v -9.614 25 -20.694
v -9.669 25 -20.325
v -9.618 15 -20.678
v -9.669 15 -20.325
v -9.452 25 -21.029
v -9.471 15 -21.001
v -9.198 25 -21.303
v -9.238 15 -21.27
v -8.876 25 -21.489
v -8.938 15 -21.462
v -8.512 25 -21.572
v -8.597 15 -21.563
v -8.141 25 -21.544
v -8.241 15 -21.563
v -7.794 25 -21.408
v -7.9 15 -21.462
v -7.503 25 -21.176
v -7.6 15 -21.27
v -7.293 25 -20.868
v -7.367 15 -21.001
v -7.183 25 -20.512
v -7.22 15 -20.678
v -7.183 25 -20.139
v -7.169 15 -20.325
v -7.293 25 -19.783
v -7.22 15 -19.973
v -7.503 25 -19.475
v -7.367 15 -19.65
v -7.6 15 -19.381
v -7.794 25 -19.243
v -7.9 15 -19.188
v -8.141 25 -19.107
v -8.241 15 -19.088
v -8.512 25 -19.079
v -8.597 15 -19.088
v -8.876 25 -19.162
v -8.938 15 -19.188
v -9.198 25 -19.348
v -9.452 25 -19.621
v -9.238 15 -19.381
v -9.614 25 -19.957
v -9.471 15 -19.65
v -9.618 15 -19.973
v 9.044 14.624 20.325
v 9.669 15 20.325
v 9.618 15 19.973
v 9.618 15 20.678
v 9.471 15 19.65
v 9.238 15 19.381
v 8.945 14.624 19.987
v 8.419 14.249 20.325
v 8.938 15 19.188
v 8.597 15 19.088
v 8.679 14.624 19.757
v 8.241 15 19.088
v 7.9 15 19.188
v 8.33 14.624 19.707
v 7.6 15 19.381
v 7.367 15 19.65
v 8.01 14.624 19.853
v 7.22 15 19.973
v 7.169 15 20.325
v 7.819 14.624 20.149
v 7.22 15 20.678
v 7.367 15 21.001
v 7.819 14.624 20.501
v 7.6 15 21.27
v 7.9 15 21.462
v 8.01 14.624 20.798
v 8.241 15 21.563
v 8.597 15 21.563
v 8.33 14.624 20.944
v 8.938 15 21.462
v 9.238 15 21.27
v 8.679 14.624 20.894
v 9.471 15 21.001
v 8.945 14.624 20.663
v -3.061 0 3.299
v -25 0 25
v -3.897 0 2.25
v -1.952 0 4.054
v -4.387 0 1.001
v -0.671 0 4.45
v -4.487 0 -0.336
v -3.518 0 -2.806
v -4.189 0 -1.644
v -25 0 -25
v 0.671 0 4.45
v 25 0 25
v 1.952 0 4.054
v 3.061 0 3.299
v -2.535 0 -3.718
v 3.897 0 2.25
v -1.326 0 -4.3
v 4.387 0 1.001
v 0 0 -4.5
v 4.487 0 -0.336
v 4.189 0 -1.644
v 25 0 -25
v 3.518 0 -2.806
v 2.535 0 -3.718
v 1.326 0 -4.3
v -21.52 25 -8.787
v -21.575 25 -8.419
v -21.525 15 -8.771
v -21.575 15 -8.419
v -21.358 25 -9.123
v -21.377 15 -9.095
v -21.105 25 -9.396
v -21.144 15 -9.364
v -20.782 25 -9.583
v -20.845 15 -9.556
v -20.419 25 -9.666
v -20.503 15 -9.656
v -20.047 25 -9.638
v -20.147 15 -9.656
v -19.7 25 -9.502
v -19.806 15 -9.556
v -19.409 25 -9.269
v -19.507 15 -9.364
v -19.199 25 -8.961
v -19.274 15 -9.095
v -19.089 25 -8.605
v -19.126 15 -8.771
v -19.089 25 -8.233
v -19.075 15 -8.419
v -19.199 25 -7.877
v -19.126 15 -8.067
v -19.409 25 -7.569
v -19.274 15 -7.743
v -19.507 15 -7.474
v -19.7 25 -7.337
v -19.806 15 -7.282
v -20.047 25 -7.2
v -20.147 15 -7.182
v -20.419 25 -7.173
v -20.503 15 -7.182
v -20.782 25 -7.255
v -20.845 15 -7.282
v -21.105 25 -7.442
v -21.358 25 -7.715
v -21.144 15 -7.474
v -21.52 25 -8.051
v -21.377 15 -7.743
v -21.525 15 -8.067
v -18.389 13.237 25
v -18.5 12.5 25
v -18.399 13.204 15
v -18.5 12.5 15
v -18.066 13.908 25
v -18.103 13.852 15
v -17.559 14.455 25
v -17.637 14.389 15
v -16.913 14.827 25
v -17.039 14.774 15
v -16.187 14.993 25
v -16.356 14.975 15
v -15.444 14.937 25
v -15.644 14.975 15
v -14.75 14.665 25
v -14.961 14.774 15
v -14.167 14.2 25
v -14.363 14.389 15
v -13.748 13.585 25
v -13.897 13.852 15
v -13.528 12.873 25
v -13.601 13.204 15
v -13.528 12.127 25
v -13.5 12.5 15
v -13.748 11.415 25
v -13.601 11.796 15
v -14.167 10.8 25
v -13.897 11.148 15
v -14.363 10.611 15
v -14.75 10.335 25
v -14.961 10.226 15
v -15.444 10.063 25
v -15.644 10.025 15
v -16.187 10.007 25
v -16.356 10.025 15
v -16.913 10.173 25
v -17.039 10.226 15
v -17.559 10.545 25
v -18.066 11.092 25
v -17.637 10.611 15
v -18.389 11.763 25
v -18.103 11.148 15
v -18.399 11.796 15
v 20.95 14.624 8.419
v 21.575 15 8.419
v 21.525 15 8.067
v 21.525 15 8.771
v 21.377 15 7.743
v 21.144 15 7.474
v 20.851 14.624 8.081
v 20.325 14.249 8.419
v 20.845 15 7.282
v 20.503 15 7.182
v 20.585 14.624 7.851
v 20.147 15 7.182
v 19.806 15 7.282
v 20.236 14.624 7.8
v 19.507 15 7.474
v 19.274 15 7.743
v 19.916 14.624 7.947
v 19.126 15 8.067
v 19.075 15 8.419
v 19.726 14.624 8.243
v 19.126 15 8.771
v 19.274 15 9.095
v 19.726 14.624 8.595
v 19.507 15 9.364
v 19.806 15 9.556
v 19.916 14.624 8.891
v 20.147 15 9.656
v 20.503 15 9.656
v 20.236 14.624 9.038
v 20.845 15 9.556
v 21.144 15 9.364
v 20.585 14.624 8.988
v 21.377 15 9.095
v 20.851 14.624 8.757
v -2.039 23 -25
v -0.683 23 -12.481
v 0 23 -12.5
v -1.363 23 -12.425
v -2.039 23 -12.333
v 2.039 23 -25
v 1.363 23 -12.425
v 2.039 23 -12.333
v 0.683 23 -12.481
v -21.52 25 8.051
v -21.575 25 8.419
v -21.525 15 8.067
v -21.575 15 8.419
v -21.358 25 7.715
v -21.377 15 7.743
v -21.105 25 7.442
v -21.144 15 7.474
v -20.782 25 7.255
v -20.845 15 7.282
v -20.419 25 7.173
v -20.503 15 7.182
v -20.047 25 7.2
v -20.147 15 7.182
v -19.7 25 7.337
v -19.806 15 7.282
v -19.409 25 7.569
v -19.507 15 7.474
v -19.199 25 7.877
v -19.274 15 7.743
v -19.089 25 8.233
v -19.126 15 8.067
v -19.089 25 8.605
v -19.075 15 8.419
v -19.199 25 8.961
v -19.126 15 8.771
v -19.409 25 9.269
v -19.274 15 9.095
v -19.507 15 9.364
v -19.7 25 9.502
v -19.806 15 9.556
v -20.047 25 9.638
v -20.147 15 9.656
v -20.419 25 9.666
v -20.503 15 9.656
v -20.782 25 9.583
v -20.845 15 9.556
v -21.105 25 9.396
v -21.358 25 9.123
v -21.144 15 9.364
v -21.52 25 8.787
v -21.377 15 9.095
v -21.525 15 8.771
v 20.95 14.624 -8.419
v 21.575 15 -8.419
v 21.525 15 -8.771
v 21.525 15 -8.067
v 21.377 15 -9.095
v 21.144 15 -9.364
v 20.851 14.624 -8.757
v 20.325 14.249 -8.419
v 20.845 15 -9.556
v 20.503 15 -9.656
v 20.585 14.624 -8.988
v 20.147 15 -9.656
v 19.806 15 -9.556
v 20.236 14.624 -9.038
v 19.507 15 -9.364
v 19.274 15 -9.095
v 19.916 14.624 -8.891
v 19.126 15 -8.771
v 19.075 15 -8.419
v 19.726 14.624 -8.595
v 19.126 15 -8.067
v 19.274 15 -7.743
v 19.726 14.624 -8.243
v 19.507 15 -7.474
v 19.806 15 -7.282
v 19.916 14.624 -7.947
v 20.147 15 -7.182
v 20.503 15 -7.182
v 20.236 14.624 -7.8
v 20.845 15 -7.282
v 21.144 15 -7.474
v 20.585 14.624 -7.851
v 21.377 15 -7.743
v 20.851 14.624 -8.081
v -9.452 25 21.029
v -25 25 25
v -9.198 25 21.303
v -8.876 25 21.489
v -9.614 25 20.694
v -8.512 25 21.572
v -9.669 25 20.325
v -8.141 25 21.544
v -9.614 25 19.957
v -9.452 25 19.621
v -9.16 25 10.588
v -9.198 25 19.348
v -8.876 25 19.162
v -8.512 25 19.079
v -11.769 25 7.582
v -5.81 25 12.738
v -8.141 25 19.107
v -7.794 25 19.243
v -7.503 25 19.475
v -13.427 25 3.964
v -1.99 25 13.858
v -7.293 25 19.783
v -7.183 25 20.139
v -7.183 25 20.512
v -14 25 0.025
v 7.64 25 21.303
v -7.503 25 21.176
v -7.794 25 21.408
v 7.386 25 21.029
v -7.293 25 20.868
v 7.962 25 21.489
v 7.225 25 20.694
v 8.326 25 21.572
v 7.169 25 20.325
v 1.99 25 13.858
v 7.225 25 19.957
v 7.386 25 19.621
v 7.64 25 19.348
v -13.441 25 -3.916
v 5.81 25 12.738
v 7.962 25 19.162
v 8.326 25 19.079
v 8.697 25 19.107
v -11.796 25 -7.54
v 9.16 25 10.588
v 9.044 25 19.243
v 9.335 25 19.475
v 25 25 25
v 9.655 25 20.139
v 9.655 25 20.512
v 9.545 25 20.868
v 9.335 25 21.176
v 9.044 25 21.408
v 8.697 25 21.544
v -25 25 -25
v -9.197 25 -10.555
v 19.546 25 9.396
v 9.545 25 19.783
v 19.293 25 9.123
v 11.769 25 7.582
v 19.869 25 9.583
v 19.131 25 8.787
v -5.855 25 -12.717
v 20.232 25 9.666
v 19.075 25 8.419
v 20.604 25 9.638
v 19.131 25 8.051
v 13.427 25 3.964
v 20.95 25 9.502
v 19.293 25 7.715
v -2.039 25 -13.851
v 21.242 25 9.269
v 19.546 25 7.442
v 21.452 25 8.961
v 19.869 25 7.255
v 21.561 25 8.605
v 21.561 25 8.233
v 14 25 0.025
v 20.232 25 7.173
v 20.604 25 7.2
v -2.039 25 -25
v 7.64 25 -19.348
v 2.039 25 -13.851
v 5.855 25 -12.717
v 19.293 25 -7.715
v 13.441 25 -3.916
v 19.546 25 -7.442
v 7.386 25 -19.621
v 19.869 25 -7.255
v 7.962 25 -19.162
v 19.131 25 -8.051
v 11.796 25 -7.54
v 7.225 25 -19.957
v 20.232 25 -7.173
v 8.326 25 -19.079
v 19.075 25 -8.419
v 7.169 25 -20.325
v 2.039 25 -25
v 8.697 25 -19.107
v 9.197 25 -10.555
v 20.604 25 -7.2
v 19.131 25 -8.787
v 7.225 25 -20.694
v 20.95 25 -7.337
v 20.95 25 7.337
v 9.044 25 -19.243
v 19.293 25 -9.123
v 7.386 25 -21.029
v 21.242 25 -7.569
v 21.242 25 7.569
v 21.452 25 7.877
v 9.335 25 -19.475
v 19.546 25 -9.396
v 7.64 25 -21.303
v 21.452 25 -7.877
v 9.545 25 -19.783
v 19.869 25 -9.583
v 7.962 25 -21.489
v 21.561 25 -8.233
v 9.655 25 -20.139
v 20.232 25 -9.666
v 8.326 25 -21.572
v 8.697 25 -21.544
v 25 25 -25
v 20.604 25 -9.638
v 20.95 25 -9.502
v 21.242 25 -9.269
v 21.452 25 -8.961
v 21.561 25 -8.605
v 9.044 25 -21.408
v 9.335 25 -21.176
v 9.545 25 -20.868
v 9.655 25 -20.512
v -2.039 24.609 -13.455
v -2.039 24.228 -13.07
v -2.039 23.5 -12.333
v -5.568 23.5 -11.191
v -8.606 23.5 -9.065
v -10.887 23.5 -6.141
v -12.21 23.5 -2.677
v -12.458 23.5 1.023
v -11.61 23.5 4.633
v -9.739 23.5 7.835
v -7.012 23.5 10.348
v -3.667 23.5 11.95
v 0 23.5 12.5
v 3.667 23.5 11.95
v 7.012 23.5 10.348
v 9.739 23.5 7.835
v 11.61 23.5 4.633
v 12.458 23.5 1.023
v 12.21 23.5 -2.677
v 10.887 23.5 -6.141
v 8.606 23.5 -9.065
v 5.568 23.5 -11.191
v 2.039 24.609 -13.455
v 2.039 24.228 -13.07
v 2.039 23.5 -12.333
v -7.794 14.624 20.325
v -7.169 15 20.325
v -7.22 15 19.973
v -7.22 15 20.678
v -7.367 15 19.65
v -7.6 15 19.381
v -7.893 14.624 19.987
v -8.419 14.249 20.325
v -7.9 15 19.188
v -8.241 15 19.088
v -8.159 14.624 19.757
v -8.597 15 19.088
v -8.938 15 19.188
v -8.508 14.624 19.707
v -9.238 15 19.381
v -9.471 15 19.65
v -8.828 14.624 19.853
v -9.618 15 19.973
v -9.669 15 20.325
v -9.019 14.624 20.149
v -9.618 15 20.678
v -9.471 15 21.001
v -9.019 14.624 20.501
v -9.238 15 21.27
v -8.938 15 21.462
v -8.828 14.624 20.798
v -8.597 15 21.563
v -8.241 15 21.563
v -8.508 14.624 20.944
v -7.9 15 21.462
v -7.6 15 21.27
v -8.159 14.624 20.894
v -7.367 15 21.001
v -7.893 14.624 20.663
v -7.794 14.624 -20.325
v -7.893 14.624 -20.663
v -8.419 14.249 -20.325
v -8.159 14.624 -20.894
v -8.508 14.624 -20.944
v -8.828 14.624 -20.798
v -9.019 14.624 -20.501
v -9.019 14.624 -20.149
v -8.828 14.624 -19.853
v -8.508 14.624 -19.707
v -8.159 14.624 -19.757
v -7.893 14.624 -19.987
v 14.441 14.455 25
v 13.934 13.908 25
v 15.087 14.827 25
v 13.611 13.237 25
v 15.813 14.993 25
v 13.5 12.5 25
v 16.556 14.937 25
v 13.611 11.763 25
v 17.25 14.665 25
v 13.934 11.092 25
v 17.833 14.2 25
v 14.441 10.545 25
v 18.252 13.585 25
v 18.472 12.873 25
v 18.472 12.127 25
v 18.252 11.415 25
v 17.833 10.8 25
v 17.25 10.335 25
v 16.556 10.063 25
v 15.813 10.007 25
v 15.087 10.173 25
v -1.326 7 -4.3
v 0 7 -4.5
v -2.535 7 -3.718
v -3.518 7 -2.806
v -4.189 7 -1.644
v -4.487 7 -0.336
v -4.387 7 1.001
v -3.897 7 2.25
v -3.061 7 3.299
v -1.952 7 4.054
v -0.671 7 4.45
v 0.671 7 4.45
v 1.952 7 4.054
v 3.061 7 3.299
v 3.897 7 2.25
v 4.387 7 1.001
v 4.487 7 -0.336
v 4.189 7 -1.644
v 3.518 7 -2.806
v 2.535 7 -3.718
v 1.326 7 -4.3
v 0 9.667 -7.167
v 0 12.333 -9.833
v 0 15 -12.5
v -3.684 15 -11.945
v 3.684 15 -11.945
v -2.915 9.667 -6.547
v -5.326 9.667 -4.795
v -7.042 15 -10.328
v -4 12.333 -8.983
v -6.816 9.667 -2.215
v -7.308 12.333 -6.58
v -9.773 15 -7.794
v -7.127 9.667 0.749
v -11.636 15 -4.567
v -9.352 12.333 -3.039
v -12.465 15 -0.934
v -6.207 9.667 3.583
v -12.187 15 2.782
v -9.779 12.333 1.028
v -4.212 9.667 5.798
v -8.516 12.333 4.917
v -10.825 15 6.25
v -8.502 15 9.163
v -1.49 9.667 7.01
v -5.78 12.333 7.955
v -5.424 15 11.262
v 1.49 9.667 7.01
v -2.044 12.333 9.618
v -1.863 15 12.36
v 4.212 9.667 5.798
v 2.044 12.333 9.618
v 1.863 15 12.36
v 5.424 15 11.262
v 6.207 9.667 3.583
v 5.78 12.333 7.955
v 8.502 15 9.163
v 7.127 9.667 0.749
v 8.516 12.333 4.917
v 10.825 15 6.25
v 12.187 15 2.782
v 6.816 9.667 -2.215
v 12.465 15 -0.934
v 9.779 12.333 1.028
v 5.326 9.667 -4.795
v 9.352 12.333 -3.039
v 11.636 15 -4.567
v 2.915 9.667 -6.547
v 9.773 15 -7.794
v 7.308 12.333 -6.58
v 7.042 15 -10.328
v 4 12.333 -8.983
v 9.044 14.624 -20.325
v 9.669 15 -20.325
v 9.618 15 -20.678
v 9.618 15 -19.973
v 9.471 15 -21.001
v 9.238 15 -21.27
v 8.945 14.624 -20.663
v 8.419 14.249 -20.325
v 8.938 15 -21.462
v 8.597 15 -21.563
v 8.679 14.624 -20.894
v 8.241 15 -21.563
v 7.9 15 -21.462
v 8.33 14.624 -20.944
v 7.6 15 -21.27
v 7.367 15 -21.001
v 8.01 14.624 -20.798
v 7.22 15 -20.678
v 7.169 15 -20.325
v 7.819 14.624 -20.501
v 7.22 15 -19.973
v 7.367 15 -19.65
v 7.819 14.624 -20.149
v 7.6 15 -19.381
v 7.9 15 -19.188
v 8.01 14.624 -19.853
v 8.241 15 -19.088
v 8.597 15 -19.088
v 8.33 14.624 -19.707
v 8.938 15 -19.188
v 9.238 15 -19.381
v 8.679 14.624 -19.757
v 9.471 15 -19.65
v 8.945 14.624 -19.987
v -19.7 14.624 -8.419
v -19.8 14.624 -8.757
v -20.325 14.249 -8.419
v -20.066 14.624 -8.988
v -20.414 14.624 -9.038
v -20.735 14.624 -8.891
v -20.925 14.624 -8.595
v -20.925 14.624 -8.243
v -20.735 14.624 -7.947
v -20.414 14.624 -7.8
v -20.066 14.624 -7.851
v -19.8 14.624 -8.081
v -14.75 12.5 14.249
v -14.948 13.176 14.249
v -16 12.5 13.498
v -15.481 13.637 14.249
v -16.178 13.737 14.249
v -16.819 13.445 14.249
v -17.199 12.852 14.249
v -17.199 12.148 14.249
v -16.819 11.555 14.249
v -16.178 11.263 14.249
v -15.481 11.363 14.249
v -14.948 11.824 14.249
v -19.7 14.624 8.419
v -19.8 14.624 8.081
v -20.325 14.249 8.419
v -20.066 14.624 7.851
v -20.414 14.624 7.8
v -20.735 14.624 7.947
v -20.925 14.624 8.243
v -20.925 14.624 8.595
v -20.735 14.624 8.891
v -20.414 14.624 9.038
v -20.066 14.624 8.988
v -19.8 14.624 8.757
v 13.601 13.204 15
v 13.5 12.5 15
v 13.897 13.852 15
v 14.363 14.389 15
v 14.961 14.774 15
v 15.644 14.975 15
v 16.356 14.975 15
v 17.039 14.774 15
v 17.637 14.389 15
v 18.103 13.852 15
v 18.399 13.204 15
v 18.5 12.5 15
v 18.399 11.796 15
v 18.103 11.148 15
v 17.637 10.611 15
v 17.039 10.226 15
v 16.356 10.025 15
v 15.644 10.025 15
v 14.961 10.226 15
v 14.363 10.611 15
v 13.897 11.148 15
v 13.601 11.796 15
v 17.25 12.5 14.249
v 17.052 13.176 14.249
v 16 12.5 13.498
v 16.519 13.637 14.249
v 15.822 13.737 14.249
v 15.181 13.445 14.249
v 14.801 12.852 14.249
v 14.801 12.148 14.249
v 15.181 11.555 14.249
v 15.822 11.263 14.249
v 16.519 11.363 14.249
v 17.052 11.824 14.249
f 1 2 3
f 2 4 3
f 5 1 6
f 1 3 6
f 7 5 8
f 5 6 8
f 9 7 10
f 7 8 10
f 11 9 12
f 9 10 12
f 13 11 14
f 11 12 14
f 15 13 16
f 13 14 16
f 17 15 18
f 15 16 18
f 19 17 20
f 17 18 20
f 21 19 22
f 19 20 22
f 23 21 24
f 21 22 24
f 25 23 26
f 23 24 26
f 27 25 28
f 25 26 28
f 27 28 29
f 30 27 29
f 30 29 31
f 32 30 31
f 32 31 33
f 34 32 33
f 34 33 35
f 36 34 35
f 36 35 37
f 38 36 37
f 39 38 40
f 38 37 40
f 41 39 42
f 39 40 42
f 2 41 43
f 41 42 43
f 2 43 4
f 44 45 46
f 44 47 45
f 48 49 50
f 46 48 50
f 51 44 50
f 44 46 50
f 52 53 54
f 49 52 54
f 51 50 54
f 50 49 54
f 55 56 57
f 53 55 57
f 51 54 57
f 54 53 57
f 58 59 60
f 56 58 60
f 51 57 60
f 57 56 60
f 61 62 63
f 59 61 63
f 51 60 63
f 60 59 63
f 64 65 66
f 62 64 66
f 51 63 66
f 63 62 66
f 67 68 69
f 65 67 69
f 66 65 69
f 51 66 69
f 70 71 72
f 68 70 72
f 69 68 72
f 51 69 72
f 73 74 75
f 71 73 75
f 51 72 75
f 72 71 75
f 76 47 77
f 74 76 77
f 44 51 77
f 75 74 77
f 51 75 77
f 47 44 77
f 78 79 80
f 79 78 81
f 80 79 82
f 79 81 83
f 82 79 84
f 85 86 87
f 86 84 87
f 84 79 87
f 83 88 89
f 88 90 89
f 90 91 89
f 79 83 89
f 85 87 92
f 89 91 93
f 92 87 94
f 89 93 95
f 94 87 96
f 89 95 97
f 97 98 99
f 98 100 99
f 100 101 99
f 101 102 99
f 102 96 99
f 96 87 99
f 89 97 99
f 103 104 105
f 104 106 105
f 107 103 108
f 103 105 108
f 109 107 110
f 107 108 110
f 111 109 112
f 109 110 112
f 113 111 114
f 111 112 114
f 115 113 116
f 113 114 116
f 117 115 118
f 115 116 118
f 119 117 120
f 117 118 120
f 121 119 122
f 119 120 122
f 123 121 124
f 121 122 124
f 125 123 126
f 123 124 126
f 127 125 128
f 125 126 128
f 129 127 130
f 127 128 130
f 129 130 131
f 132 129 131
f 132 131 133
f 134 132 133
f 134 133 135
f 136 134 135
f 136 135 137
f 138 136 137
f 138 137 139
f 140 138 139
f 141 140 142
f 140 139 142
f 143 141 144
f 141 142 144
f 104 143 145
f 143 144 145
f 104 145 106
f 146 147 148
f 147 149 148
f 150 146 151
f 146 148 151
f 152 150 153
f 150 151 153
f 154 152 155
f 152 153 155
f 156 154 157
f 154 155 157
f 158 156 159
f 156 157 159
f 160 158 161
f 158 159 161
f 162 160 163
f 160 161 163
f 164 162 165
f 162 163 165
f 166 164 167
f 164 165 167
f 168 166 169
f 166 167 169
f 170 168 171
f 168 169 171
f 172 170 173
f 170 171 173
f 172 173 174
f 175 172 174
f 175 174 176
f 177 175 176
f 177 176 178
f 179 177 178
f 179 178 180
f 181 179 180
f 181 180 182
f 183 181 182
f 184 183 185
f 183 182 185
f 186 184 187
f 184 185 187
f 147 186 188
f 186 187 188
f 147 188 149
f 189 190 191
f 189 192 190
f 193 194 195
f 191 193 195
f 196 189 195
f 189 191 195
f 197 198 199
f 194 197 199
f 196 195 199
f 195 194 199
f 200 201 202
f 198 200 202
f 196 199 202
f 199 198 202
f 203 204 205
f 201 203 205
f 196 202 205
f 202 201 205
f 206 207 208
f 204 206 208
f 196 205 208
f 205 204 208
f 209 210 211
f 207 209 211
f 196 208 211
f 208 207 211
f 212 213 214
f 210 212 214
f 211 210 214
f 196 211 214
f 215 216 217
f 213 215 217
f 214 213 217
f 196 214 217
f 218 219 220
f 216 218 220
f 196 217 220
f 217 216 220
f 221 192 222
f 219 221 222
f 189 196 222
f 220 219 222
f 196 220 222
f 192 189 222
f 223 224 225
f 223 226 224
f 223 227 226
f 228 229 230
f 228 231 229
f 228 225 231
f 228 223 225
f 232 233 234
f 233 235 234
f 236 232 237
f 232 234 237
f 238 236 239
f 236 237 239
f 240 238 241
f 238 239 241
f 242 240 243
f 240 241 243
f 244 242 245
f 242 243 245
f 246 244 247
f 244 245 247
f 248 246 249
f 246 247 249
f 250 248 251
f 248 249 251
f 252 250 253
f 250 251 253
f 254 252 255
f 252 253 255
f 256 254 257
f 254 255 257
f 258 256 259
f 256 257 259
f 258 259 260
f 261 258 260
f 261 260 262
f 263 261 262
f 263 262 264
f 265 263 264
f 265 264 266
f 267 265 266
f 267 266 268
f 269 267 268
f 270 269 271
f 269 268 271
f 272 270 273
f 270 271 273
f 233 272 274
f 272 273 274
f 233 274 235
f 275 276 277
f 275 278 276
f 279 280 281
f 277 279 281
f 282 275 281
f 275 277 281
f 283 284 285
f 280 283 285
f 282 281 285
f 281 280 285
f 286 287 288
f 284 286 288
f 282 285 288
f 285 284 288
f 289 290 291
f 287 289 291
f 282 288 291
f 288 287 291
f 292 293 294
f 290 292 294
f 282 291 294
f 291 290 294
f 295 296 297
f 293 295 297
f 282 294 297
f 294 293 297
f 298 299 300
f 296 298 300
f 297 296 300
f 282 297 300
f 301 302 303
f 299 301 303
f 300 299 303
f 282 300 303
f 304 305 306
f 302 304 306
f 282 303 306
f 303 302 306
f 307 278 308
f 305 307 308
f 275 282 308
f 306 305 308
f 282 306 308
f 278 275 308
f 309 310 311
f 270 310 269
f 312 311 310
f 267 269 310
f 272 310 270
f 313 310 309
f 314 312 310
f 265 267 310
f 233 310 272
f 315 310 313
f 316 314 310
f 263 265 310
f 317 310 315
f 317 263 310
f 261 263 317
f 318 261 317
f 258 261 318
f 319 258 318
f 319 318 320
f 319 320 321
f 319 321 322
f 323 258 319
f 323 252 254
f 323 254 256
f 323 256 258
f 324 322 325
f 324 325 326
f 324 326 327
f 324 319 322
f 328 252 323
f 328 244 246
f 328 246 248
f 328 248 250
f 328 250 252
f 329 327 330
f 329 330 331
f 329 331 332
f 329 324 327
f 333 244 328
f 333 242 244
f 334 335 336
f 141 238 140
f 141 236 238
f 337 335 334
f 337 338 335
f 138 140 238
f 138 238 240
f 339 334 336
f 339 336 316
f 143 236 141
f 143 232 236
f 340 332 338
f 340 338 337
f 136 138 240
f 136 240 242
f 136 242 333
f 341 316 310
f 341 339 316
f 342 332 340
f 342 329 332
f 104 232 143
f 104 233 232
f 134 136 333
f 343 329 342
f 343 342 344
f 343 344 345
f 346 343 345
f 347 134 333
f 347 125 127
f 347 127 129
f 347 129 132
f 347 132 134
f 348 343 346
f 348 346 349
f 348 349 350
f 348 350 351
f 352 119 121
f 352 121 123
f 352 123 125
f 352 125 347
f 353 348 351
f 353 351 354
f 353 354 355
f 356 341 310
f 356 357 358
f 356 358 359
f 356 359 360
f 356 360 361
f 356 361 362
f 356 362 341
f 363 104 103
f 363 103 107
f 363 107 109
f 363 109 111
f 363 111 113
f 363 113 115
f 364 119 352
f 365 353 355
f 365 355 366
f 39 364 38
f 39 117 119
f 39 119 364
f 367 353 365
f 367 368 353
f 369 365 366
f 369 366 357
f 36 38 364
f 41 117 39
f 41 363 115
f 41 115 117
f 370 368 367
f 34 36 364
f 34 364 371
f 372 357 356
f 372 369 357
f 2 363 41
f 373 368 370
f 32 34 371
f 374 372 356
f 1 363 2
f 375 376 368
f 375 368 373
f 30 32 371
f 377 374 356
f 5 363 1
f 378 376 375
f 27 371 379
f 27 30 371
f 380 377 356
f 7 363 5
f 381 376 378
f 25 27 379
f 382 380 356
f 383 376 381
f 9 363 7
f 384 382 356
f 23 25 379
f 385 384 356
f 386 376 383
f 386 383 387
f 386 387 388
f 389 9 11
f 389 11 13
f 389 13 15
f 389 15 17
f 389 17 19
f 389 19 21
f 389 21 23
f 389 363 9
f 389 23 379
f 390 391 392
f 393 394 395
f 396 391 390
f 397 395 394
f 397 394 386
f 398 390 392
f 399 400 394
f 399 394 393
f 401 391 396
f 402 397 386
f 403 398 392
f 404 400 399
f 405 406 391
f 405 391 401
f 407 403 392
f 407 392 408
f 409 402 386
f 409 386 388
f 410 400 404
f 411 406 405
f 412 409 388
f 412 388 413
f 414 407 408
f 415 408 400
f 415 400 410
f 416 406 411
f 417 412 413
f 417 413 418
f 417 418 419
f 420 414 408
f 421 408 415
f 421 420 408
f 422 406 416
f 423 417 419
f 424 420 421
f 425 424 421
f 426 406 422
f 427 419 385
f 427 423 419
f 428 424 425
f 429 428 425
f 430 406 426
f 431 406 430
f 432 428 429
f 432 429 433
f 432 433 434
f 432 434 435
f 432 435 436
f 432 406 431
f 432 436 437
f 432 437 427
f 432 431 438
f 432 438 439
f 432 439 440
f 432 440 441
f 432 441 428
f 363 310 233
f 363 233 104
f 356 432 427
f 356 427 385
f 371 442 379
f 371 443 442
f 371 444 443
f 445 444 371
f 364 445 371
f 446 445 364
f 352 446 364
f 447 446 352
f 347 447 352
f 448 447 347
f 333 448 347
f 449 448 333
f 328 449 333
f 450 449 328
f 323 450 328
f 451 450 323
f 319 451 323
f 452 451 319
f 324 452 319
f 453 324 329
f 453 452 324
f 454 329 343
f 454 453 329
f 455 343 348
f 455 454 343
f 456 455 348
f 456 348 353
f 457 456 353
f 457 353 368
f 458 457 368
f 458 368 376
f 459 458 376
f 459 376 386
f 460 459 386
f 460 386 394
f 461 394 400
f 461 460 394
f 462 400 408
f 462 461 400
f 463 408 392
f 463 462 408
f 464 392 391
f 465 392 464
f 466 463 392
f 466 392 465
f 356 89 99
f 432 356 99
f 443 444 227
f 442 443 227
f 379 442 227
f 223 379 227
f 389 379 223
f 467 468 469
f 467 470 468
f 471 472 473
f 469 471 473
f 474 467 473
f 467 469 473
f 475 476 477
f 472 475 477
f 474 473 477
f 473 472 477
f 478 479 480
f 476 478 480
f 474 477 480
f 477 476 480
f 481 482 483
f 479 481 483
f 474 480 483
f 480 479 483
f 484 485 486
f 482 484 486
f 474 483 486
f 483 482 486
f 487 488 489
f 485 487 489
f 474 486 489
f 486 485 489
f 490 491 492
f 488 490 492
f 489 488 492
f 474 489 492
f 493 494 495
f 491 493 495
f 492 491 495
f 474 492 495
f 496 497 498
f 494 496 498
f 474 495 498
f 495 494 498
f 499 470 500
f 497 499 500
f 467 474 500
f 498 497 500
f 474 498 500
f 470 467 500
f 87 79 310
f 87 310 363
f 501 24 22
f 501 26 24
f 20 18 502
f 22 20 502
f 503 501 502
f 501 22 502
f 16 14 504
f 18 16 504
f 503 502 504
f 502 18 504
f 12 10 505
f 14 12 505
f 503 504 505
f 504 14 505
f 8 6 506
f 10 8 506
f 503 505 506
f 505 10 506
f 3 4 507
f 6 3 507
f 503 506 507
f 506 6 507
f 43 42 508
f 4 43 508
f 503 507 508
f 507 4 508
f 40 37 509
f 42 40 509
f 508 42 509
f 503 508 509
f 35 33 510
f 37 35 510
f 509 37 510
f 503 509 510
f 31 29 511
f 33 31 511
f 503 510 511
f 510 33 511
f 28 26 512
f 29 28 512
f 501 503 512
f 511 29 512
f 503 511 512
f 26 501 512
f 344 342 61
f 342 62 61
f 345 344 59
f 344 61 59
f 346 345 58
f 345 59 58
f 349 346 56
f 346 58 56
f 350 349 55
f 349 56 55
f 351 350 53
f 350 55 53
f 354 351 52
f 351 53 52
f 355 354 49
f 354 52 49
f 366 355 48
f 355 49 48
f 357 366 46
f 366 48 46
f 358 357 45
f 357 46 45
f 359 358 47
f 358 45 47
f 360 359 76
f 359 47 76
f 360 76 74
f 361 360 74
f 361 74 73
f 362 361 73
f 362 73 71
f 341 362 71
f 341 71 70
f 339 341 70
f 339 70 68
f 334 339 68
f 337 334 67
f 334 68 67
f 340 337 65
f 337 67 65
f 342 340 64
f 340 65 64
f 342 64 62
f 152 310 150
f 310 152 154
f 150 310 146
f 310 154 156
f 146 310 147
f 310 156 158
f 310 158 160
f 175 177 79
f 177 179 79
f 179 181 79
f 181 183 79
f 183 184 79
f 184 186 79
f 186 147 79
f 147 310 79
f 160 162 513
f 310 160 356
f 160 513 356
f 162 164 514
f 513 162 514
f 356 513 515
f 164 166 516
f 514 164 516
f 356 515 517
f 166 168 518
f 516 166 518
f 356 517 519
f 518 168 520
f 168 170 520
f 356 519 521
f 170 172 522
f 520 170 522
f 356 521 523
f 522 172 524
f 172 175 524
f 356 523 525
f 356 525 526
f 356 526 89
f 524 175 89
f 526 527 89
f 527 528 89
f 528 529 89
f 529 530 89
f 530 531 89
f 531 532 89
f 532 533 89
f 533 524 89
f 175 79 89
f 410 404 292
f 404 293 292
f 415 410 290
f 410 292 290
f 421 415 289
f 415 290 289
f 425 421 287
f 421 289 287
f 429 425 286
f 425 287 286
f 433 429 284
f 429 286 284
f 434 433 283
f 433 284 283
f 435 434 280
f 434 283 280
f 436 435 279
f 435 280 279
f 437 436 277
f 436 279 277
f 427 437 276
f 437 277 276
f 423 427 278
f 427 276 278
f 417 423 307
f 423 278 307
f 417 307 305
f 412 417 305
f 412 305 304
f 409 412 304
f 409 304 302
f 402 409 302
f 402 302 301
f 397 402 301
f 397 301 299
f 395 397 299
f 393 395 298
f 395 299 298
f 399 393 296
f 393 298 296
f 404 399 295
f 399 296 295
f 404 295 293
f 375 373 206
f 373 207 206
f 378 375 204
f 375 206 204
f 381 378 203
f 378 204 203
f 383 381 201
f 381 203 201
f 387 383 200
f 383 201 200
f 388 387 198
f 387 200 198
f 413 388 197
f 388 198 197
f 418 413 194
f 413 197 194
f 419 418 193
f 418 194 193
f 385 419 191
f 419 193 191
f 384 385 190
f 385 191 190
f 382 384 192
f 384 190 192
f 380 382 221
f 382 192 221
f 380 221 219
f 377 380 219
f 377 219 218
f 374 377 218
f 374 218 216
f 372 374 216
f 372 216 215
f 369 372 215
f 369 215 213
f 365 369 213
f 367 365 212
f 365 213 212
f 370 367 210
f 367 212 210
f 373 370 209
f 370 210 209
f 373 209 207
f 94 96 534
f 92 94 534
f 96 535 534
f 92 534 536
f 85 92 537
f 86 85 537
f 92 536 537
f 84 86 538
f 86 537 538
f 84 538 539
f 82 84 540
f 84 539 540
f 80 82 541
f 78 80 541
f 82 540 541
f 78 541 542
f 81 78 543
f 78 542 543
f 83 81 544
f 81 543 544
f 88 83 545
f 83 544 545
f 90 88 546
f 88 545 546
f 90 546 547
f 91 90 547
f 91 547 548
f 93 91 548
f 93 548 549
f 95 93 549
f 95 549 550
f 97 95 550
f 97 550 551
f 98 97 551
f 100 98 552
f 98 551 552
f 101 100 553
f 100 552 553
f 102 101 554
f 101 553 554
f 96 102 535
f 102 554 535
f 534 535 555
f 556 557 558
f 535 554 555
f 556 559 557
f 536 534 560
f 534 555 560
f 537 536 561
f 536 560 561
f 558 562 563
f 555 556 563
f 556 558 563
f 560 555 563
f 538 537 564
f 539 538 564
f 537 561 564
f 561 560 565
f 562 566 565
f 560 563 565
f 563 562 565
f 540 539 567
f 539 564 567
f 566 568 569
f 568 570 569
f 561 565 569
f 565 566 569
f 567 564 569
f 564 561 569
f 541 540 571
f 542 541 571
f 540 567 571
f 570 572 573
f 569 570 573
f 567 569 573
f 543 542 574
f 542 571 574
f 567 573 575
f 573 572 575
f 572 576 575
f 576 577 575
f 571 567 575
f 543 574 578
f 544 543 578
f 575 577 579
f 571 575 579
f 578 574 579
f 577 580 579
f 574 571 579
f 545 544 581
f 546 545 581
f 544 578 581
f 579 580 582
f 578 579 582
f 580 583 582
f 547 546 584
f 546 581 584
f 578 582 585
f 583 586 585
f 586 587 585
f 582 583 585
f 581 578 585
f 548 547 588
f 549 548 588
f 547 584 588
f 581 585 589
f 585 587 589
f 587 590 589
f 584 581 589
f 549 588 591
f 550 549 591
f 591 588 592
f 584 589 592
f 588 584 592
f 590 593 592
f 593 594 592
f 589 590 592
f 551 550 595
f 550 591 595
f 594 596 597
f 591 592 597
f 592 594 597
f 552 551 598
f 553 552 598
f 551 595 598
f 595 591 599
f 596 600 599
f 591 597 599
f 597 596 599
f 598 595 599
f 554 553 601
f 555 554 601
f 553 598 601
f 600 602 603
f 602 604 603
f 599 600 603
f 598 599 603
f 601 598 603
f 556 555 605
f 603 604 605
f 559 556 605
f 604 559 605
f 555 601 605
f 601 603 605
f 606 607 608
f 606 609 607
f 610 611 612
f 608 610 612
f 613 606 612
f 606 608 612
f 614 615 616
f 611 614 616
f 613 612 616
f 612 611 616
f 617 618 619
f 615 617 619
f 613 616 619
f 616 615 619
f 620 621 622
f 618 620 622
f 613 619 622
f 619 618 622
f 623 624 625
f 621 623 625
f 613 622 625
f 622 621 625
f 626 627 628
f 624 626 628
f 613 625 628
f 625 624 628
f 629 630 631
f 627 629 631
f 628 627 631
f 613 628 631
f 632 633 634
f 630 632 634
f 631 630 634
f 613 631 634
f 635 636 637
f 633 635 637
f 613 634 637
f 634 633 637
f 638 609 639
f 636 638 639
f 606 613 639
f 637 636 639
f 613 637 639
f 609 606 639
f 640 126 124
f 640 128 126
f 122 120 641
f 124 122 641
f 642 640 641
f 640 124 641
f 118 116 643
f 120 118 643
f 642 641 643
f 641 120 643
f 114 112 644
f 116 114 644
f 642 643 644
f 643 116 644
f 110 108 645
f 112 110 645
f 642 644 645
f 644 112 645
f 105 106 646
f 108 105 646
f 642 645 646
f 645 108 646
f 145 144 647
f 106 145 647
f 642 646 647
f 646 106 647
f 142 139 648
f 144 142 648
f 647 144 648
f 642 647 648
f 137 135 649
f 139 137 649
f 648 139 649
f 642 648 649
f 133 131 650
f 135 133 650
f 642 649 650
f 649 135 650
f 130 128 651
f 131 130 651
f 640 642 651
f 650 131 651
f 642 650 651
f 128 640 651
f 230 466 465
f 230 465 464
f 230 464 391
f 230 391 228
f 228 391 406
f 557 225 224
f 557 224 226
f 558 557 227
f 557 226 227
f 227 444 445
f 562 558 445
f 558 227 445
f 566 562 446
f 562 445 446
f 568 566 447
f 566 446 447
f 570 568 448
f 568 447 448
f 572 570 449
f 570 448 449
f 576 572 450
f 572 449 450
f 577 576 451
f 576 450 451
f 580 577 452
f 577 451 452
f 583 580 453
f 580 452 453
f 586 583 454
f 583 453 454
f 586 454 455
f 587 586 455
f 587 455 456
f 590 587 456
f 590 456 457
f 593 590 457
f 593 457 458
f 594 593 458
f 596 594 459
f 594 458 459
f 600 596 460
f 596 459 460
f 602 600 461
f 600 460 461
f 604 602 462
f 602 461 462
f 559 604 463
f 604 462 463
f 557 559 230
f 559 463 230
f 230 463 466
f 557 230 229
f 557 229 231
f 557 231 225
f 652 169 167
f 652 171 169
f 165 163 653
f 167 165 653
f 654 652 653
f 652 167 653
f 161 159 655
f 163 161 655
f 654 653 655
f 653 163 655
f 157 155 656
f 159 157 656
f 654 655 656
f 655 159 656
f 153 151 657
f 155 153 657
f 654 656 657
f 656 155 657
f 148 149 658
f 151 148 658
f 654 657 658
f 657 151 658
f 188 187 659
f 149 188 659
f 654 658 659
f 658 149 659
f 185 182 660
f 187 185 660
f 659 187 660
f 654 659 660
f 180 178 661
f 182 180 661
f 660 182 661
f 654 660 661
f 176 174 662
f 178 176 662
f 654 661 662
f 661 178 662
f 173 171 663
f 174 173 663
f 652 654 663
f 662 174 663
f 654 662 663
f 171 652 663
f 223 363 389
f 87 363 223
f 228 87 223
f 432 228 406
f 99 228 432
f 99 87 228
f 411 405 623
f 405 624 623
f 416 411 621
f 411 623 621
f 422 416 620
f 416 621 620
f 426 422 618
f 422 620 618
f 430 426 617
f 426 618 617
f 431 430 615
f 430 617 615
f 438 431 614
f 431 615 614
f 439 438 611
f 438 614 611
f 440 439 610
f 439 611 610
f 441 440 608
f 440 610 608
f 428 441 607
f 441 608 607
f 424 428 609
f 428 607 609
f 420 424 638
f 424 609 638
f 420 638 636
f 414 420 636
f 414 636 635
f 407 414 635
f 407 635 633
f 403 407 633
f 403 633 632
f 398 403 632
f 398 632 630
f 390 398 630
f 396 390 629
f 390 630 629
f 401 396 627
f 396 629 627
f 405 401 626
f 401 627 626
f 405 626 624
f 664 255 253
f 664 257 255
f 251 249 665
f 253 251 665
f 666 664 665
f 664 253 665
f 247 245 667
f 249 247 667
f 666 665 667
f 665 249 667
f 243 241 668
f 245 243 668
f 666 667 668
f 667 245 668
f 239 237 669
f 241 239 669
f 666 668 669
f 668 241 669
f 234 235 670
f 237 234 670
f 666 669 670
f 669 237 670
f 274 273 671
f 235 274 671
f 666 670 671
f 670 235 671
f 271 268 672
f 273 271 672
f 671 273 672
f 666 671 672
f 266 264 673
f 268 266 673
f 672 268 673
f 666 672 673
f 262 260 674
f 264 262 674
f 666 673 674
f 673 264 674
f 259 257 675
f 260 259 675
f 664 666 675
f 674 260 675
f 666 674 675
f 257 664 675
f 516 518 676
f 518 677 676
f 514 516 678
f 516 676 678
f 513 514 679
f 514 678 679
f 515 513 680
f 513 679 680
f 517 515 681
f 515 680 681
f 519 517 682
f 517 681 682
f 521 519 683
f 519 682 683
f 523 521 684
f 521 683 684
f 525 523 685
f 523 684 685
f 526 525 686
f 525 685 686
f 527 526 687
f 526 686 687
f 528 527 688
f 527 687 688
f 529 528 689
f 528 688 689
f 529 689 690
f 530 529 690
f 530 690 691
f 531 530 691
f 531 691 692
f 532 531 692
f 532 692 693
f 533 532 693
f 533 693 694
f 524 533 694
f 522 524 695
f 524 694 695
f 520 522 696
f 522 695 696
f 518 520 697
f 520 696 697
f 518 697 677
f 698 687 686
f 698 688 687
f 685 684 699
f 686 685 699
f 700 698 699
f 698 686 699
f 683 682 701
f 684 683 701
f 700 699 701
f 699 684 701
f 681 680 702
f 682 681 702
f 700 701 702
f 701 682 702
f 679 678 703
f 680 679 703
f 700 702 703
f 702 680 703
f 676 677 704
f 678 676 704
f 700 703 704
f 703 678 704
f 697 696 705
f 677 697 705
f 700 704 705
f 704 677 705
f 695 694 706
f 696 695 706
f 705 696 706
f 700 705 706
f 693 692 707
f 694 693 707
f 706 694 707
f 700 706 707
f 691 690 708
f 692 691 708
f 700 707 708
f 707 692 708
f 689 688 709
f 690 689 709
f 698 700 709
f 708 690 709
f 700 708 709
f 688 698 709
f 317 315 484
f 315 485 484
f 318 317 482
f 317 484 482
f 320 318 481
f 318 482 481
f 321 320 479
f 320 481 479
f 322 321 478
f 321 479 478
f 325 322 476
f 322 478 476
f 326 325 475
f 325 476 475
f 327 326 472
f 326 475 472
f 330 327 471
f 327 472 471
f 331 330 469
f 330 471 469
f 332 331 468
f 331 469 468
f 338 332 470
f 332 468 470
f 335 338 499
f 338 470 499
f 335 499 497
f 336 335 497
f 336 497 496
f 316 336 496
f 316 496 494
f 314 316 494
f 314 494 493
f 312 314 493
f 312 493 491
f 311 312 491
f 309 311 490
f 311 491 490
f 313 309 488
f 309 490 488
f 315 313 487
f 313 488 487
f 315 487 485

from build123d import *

# Parameters (mm, degrees)
ESQUISSE1_W                                   = 50
ESQUISSE1_H                                   = 50
BOSS_EXTRU_1_DEPTH                            = 25
TROU_POUR_TARAUDAGE_POUR_TROU_TARAUD_M3_D     = 2.5
TROU_POUR_TARAUDAGE_POUR_TROU_TARAUD_M3_DEPTH = 10
TROU_POUR_TARAUDAGE_POUR_TROU_TARAUD_M3_TIP   = 0.751075774
TROU_POUR_TARAUDAGE_POUR_TROU_TARAUD_M6_D     = 5
TROU_POUR_TARAUDAGE_POUR_TROU_TARAUD_M6_DEPTH = 10
TROU_POUR_TARAUDAGE_POUR_TROU_TARAUD_M6_TIP   = 1.502151548
ESQUISSE12_W                                  = 4.07874476
ESQUISSE12_H                                  = 14
ENL_V_MAT_EXTRU_1_DEPTH                       = 2
CHANFREIN1_SIZE                               = 1.5


with BuildPart() as part:
    # Esquisse1 → Boss.-Extru.1 (new body)
    with BuildSketch(Plane(origin=(0, 0, 0), x_dir=(1, 0, 0), z_dir=(0, 1, 0))):
        Rectangle(ESQUISSE1_W, ESQUISSE1_H)
    extrude(amount=BOSS_EXTRU_1_DEPTH)

    # Esquisse2 → Enlèvement de matière-Révolution1 (revolve, cut)
    with BuildSketch(Plane.XY, mode=Mode.PRIVATE) as enl_vement_de_mati_re_r_volution1_sk:
        Polygon((0, 0), (4.5, 0), (4.5, 7), (12.5, 15), (12.5, 25), (0, 25), align=None)
    revolve(enl_vement_de_mati_re_r_volution1_sk.sketch.rotate(Axis((0, 0, 0), (0, 1, 0)), 90), axis=Axis((0, 0, 0), (0, 1, 0)), mode=Mode.SUBTRACT)

    # Trou pour taraudage pour trou taraudé M31
    with Locations(Plane(origin=(0, 25, 0), x_dir=(1, 0, 0), z_dir=(0, 1, 0))):
        with Locations((-8.419035512, 20.325349715), (8.419035512, 20.325349715), (20.325349715, 8.419035512), (20.325349715, -8.419035512), (8.419035512, -20.325349715), (-8.419035512, -20.325349715), (-20.325349715, -8.419035512), (-20.325349715, 8.419035512)):
            Hole(TROU_POUR_TARAUDAGE_POUR_TROU_TARAUD_M3_D / 2, depth=TROU_POUR_TARAUDAGE_POUR_TROU_TARAUD_M3_DEPTH)
            with Locations((0, 0, -(TROU_POUR_TARAUDAGE_POUR_TROU_TARAUD_M3_DEPTH + TROU_POUR_TARAUDAGE_POUR_TROU_TARAUD_M3_TIP / 2))):  # 118° drill point
                Cone(0, TROU_POUR_TARAUDAGE_POUR_TROU_TARAUD_M3_D / 2, TROU_POUR_TARAUDAGE_POUR_TROU_TARAUD_M3_TIP, mode=Mode.SUBTRACT)

    # Trou pour taraudage pour trou taraudé M61
    with Locations(Plane.XY.offset(25)):
        with Locations((-16, 12.5), (16, 12.5)):
            Hole(TROU_POUR_TARAUDAGE_POUR_TROU_TARAUD_M6_D / 2, depth=TROU_POUR_TARAUDAGE_POUR_TROU_TARAUD_M6_DEPTH)
            with Locations((0, 0, -(TROU_POUR_TARAUDAGE_POUR_TROU_TARAUD_M6_DEPTH + TROU_POUR_TARAUDAGE_POUR_TROU_TARAUD_M6_TIP / 2))):  # 118° drill point
                Cone(0, TROU_POUR_TARAUDAGE_POUR_TROU_TARAUD_M6_D / 2, TROU_POUR_TARAUDAGE_POUR_TROU_TARAUD_M6_TIP, mode=Mode.SUBTRACT)

    # Esquisse12 → Enlèv. mat.-Extru.1 (cut)
    with BuildSketch(Plane(origin=(0, 25, 0), x_dir=(1, 0, 0), z_dir=(0, 1, 0))):
        with Locations((0, 18)):
            Rectangle(ESQUISSE12_W, ESQUISSE12_H)
    extrude(amount=-ENL_V_MAT_EXTRU_1_DEPTH, mode=Mode.SUBTRACT)

    # Chanfrein1
    chanfrein1_edges = [part.edges().sort_by_distance(p)[0] for p in [
        (0, 25, 12.5),
    ]]
    chamfer(chanfrein1_edges, length=CHANFREIN1_SIZE)


solid = part.part
